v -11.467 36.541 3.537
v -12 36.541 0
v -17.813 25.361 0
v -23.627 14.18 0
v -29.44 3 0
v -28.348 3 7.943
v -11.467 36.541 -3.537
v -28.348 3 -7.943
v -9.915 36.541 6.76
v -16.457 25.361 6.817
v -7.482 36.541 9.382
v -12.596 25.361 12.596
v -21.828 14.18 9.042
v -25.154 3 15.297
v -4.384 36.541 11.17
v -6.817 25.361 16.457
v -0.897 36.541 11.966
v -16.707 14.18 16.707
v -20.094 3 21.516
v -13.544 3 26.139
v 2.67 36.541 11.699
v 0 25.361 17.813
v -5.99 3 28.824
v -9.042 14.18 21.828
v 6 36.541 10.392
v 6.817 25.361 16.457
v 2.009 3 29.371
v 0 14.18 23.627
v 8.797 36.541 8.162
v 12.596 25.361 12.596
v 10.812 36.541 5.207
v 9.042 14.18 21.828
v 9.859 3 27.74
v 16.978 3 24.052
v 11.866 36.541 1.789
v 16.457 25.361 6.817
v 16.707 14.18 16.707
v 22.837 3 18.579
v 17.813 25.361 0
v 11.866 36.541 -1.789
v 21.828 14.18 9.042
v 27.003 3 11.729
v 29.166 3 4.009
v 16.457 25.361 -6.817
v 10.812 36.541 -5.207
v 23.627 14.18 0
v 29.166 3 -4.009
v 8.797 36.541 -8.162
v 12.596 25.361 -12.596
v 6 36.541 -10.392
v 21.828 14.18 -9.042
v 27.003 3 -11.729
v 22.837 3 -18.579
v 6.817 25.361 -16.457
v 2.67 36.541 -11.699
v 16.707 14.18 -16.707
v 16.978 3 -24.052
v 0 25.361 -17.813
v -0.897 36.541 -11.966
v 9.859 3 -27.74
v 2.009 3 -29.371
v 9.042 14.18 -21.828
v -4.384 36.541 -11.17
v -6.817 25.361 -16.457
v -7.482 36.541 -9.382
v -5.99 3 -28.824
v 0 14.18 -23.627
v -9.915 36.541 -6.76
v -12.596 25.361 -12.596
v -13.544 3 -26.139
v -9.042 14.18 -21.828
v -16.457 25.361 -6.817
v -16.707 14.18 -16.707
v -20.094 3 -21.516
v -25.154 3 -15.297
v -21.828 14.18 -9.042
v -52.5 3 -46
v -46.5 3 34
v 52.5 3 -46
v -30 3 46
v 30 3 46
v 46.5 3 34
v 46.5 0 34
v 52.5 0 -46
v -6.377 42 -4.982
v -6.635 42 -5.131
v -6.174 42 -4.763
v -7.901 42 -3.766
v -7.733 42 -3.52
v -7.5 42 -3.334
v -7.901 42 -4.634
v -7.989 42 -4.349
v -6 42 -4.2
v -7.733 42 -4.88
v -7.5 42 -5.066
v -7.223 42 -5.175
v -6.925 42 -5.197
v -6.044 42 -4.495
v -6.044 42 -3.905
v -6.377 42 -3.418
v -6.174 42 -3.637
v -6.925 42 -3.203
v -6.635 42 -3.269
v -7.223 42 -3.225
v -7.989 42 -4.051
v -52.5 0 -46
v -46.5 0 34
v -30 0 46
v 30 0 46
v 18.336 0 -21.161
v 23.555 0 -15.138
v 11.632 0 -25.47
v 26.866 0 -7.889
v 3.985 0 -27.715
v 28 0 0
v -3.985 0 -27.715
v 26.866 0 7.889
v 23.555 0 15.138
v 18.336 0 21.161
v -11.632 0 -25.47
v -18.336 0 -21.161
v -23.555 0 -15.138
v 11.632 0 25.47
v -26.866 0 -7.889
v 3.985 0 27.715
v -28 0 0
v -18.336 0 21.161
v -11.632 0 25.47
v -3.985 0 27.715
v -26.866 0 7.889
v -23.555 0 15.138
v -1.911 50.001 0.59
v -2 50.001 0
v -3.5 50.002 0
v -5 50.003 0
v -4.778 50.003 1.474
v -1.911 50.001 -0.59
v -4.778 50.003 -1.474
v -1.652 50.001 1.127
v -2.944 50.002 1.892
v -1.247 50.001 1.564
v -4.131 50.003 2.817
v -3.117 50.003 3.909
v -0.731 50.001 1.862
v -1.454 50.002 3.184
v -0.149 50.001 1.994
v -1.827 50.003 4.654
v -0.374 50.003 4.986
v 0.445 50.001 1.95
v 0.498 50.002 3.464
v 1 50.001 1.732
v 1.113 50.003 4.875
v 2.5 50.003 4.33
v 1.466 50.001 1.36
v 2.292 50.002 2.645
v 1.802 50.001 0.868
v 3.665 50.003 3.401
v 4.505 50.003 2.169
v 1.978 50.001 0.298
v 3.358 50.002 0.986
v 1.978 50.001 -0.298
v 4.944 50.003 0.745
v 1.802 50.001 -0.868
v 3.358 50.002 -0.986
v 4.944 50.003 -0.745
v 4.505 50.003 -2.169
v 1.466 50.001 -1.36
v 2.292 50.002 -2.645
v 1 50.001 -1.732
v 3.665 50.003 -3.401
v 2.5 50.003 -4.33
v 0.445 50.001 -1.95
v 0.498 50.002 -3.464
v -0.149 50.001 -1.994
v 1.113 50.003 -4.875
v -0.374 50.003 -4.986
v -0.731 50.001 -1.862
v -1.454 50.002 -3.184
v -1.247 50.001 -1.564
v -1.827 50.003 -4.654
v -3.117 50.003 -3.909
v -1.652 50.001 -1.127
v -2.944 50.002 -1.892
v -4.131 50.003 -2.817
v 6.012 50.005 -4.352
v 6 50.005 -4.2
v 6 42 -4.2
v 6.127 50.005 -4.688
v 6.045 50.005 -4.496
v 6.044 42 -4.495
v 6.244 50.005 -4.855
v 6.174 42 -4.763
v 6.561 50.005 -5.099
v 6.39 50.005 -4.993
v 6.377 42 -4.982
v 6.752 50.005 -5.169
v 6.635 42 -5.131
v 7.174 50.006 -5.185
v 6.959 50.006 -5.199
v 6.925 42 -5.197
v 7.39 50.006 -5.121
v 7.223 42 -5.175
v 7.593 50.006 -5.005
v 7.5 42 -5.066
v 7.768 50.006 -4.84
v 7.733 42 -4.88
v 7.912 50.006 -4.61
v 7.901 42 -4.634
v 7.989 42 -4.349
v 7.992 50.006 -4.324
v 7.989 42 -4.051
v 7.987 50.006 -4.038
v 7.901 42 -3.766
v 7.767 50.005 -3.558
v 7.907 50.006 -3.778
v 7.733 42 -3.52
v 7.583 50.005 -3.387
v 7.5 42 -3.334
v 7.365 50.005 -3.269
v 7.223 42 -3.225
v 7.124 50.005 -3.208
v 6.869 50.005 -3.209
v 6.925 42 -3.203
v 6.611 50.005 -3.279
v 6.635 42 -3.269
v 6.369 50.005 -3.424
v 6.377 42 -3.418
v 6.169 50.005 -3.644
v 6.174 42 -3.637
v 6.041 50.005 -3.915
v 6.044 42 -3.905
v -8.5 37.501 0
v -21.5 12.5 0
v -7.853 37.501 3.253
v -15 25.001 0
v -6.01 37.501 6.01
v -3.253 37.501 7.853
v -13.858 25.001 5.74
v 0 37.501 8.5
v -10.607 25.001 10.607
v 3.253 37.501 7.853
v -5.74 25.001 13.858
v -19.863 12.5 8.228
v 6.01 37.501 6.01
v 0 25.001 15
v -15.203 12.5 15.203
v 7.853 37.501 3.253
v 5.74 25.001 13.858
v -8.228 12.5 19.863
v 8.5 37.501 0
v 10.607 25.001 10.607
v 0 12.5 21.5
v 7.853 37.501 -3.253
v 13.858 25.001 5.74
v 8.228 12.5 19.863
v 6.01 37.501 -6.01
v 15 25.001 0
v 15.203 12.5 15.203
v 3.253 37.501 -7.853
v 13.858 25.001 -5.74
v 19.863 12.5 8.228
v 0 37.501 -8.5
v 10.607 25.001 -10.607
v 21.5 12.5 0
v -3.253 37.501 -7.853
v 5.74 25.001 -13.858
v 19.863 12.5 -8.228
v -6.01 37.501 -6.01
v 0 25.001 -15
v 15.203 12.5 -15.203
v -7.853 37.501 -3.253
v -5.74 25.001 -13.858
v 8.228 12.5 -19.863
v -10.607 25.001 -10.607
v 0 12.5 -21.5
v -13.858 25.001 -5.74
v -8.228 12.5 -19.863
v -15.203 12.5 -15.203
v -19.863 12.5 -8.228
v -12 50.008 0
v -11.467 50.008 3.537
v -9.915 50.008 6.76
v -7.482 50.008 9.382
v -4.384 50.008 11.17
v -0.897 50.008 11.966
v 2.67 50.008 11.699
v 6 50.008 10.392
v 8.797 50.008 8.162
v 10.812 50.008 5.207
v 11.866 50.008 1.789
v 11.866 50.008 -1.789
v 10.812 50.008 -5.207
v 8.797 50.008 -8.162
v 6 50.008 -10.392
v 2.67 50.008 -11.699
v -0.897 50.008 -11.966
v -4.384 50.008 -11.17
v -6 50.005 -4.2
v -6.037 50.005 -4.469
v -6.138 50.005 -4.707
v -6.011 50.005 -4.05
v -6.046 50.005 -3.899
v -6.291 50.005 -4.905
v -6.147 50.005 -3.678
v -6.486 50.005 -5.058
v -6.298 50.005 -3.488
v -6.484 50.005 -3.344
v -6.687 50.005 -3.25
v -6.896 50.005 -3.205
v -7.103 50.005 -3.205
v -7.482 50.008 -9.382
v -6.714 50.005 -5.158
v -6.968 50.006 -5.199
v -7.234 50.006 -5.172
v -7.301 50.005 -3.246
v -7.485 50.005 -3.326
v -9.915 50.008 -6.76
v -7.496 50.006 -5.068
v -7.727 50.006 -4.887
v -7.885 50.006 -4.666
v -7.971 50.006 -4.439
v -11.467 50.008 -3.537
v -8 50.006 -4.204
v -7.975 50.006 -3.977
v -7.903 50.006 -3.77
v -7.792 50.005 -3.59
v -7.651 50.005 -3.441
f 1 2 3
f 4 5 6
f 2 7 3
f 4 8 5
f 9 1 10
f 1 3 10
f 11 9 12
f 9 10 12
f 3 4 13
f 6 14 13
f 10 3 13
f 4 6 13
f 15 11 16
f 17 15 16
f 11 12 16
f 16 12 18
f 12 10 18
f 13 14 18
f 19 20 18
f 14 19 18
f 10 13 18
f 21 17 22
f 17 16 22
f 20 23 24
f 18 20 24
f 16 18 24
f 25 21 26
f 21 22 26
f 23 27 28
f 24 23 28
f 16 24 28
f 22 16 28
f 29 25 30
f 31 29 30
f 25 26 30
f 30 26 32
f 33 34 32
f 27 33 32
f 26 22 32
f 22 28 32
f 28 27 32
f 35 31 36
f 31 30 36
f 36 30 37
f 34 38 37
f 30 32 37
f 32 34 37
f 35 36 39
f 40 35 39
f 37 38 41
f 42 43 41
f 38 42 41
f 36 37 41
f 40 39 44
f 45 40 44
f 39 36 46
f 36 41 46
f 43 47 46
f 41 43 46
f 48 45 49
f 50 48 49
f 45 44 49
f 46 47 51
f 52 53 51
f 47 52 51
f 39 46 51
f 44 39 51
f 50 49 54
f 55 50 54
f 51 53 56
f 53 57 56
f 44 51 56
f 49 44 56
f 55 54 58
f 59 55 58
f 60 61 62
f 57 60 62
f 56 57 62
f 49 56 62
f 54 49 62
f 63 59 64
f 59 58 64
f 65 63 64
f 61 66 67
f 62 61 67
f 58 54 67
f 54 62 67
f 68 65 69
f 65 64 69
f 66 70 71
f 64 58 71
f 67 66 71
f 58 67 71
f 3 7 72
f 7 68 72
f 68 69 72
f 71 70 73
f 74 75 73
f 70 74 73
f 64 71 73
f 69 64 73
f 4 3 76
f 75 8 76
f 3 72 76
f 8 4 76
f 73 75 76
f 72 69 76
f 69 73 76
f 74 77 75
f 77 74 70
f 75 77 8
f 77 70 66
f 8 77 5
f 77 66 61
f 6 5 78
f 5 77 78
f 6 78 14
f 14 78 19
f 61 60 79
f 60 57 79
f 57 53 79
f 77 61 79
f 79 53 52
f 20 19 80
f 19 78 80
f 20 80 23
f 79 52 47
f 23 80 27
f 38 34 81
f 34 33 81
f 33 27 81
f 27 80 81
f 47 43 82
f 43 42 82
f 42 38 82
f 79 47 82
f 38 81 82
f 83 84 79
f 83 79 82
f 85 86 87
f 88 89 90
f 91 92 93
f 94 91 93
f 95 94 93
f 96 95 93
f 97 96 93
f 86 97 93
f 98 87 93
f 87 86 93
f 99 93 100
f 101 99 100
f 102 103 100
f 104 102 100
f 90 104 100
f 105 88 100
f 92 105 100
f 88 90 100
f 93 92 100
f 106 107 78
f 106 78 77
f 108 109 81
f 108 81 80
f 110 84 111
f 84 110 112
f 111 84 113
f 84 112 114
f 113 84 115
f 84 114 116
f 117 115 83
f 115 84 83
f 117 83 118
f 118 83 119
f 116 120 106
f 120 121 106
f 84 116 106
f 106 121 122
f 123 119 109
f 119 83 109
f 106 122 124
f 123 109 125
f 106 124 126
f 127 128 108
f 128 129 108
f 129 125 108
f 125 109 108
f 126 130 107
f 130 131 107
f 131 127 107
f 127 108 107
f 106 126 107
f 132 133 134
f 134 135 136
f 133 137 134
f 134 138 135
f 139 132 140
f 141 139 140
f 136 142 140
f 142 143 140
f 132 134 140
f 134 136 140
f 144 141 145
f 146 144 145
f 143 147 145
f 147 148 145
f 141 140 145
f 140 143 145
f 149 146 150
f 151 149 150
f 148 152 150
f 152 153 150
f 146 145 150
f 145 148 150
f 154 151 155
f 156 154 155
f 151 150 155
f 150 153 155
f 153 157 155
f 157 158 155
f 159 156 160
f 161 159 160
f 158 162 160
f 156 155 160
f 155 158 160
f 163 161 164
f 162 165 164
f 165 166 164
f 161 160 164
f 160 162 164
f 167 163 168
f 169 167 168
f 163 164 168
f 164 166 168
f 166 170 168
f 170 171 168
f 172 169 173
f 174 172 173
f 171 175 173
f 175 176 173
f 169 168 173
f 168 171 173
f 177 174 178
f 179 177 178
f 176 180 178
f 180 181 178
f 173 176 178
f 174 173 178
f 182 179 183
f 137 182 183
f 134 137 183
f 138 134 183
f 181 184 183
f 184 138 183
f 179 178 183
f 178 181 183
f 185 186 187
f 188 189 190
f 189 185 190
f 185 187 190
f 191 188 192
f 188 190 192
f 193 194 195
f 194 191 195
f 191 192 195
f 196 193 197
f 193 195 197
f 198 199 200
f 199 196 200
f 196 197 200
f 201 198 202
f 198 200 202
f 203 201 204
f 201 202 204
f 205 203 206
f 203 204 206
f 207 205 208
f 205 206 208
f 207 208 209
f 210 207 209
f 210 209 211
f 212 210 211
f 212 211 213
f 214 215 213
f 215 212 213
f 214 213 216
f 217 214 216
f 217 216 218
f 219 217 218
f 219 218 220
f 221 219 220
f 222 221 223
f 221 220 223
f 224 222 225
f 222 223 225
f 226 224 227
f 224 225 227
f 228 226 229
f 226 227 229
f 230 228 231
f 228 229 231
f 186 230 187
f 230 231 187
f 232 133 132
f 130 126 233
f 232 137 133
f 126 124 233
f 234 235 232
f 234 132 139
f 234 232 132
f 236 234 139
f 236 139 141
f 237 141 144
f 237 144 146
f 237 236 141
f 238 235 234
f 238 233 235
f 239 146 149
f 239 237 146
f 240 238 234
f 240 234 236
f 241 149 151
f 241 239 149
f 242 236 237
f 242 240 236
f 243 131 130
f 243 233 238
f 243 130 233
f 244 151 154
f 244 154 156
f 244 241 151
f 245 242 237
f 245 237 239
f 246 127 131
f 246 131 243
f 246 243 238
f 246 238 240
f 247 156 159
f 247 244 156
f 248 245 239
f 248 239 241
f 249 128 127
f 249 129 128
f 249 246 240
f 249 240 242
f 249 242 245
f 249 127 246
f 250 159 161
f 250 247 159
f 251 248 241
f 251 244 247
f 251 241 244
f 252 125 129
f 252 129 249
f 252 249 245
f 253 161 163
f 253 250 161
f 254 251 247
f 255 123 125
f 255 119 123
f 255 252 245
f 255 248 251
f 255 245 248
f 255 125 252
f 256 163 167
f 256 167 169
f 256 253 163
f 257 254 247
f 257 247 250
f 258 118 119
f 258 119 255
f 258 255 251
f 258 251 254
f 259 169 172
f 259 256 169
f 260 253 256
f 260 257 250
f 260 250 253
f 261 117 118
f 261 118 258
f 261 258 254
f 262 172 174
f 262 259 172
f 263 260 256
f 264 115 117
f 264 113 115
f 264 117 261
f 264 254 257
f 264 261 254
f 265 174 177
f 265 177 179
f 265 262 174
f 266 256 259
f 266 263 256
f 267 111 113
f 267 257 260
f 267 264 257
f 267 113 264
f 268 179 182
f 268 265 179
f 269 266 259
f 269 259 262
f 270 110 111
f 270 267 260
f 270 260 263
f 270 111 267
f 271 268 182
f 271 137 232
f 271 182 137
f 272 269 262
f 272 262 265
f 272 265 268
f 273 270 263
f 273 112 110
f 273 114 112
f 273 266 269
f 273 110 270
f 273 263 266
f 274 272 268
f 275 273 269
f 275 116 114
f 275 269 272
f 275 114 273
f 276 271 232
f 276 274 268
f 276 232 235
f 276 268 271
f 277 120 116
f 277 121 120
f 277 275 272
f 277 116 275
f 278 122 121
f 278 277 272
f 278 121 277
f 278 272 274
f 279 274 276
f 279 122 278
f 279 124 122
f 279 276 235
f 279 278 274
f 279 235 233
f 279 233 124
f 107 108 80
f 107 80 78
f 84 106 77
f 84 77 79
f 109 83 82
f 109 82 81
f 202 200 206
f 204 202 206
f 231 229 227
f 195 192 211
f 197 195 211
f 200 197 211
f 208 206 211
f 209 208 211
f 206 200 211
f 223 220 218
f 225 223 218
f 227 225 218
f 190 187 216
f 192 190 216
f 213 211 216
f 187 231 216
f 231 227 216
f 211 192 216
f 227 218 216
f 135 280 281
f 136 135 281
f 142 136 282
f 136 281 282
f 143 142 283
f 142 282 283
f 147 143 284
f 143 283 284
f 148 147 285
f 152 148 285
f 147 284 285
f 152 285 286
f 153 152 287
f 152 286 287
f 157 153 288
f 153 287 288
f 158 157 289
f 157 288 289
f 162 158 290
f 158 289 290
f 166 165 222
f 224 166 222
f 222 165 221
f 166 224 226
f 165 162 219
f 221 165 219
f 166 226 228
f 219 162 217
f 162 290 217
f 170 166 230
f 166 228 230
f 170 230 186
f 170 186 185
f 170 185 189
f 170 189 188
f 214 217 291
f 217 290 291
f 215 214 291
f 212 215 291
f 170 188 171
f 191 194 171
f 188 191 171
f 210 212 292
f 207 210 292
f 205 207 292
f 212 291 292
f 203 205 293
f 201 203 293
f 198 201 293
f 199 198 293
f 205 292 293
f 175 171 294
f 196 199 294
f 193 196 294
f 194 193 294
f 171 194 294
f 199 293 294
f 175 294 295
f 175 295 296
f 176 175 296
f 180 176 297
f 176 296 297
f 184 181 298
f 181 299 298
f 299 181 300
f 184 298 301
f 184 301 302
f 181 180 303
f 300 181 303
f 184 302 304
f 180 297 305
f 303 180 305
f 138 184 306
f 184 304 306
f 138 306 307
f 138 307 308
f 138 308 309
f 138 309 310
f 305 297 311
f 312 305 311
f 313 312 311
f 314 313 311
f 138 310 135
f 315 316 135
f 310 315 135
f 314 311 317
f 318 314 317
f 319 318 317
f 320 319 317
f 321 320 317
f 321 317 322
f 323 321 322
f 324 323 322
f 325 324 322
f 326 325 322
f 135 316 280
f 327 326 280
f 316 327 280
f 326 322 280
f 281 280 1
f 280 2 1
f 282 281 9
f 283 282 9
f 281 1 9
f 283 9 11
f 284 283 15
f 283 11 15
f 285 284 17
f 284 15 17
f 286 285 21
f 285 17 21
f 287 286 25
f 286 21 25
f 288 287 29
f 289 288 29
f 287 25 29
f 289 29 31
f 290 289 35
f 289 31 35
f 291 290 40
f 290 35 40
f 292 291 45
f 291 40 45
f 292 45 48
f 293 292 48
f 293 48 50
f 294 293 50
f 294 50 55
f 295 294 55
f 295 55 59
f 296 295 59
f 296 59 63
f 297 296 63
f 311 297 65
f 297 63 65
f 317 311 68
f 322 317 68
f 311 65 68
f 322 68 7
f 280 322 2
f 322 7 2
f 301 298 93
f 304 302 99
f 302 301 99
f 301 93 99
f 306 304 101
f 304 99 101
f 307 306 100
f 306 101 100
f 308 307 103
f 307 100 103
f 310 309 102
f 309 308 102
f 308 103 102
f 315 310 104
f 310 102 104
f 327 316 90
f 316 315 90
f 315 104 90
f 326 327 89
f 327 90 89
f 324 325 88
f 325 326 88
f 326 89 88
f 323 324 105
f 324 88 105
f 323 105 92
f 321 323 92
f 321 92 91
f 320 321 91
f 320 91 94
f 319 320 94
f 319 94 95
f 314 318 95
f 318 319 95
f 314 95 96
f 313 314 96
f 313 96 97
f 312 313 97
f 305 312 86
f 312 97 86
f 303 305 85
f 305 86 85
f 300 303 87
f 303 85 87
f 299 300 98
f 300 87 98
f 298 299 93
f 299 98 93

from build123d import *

# Parameters (mm, degrees)
F0_R     = 1
F1_DEPTH = 3
F5_START = -42
F5_DEPTH = 9


with BuildPart() as f1:
    # F0 (on Front) → F1 (new body)
    with BuildSketch(Plane.XZ):
        Polygon((-52.5, -46), (52.5, -46), (46.5, 34), (30, 46), (-30, 46), (-46.5, 34), align=None)
        with Locations((-7, -4.2)):
            Circle(F0_R, mode=Mode.SUBTRACT)
        with BuildLine():
            ThreePointArc((8, -4.2), (7, -5.2), (6, -4.2))
            ThreePointArc((6, -4.2), (7, -3.2), (8, -4.2))
        make_face(mode=Mode.SUBTRACT)
    extrude(amount=-F1_DEPTH)

    # F2 (on Top) → F3 (revolve)
    with BuildSketch(Plane.XY):
        Polygon((-28, 0), (-1.999999598, 50.0012680348), (-4.9999989951, 50.0031700871), (-12, 36.5407767282), (-31, 0), align=None)
        Polygon((-12, 36.5407767282), (-4.9999989951, 50.0031700871), (-12, 50.0076082106), align=None)
    revolve(axis=Axis((0, 25, 0), (0, 1, 0)))

    # F2 (on Top) → F4 (revolve, cut)
    with BuildSketch(Plane.XY):
        Polygon((-20, 0), (-2, 0), (-1.999999598, 50.0012680348), (-28, 0), (-22, 0), align=None)
        Polygon((-2, 0), (0, 0), (0, 50), (-1.999999598, 50.0012680348), align=None)
    revolve(axis=Axis((0, 50.0012680348, 0), (0, 1, 0)), mode=Mode.SUBTRACT)

    # F0 (on Front) → F5 (cut)
    with BuildSketch(Plane.XZ.offset(F5_START)):
        with BuildLine():
            ThreePointArc((8, -4.2), (7, -3.2), (6, -4.2))
            ThreePointArc((6, -4.2), (7, -5.2), (8, -4.2))
        make_face()
        with Locations((-7, -4.2)):
            Circle(F0_R)
    extrude(amount=-F5_DEPTH, mode=Mode.SUBTRACT)


solid = f1.part
